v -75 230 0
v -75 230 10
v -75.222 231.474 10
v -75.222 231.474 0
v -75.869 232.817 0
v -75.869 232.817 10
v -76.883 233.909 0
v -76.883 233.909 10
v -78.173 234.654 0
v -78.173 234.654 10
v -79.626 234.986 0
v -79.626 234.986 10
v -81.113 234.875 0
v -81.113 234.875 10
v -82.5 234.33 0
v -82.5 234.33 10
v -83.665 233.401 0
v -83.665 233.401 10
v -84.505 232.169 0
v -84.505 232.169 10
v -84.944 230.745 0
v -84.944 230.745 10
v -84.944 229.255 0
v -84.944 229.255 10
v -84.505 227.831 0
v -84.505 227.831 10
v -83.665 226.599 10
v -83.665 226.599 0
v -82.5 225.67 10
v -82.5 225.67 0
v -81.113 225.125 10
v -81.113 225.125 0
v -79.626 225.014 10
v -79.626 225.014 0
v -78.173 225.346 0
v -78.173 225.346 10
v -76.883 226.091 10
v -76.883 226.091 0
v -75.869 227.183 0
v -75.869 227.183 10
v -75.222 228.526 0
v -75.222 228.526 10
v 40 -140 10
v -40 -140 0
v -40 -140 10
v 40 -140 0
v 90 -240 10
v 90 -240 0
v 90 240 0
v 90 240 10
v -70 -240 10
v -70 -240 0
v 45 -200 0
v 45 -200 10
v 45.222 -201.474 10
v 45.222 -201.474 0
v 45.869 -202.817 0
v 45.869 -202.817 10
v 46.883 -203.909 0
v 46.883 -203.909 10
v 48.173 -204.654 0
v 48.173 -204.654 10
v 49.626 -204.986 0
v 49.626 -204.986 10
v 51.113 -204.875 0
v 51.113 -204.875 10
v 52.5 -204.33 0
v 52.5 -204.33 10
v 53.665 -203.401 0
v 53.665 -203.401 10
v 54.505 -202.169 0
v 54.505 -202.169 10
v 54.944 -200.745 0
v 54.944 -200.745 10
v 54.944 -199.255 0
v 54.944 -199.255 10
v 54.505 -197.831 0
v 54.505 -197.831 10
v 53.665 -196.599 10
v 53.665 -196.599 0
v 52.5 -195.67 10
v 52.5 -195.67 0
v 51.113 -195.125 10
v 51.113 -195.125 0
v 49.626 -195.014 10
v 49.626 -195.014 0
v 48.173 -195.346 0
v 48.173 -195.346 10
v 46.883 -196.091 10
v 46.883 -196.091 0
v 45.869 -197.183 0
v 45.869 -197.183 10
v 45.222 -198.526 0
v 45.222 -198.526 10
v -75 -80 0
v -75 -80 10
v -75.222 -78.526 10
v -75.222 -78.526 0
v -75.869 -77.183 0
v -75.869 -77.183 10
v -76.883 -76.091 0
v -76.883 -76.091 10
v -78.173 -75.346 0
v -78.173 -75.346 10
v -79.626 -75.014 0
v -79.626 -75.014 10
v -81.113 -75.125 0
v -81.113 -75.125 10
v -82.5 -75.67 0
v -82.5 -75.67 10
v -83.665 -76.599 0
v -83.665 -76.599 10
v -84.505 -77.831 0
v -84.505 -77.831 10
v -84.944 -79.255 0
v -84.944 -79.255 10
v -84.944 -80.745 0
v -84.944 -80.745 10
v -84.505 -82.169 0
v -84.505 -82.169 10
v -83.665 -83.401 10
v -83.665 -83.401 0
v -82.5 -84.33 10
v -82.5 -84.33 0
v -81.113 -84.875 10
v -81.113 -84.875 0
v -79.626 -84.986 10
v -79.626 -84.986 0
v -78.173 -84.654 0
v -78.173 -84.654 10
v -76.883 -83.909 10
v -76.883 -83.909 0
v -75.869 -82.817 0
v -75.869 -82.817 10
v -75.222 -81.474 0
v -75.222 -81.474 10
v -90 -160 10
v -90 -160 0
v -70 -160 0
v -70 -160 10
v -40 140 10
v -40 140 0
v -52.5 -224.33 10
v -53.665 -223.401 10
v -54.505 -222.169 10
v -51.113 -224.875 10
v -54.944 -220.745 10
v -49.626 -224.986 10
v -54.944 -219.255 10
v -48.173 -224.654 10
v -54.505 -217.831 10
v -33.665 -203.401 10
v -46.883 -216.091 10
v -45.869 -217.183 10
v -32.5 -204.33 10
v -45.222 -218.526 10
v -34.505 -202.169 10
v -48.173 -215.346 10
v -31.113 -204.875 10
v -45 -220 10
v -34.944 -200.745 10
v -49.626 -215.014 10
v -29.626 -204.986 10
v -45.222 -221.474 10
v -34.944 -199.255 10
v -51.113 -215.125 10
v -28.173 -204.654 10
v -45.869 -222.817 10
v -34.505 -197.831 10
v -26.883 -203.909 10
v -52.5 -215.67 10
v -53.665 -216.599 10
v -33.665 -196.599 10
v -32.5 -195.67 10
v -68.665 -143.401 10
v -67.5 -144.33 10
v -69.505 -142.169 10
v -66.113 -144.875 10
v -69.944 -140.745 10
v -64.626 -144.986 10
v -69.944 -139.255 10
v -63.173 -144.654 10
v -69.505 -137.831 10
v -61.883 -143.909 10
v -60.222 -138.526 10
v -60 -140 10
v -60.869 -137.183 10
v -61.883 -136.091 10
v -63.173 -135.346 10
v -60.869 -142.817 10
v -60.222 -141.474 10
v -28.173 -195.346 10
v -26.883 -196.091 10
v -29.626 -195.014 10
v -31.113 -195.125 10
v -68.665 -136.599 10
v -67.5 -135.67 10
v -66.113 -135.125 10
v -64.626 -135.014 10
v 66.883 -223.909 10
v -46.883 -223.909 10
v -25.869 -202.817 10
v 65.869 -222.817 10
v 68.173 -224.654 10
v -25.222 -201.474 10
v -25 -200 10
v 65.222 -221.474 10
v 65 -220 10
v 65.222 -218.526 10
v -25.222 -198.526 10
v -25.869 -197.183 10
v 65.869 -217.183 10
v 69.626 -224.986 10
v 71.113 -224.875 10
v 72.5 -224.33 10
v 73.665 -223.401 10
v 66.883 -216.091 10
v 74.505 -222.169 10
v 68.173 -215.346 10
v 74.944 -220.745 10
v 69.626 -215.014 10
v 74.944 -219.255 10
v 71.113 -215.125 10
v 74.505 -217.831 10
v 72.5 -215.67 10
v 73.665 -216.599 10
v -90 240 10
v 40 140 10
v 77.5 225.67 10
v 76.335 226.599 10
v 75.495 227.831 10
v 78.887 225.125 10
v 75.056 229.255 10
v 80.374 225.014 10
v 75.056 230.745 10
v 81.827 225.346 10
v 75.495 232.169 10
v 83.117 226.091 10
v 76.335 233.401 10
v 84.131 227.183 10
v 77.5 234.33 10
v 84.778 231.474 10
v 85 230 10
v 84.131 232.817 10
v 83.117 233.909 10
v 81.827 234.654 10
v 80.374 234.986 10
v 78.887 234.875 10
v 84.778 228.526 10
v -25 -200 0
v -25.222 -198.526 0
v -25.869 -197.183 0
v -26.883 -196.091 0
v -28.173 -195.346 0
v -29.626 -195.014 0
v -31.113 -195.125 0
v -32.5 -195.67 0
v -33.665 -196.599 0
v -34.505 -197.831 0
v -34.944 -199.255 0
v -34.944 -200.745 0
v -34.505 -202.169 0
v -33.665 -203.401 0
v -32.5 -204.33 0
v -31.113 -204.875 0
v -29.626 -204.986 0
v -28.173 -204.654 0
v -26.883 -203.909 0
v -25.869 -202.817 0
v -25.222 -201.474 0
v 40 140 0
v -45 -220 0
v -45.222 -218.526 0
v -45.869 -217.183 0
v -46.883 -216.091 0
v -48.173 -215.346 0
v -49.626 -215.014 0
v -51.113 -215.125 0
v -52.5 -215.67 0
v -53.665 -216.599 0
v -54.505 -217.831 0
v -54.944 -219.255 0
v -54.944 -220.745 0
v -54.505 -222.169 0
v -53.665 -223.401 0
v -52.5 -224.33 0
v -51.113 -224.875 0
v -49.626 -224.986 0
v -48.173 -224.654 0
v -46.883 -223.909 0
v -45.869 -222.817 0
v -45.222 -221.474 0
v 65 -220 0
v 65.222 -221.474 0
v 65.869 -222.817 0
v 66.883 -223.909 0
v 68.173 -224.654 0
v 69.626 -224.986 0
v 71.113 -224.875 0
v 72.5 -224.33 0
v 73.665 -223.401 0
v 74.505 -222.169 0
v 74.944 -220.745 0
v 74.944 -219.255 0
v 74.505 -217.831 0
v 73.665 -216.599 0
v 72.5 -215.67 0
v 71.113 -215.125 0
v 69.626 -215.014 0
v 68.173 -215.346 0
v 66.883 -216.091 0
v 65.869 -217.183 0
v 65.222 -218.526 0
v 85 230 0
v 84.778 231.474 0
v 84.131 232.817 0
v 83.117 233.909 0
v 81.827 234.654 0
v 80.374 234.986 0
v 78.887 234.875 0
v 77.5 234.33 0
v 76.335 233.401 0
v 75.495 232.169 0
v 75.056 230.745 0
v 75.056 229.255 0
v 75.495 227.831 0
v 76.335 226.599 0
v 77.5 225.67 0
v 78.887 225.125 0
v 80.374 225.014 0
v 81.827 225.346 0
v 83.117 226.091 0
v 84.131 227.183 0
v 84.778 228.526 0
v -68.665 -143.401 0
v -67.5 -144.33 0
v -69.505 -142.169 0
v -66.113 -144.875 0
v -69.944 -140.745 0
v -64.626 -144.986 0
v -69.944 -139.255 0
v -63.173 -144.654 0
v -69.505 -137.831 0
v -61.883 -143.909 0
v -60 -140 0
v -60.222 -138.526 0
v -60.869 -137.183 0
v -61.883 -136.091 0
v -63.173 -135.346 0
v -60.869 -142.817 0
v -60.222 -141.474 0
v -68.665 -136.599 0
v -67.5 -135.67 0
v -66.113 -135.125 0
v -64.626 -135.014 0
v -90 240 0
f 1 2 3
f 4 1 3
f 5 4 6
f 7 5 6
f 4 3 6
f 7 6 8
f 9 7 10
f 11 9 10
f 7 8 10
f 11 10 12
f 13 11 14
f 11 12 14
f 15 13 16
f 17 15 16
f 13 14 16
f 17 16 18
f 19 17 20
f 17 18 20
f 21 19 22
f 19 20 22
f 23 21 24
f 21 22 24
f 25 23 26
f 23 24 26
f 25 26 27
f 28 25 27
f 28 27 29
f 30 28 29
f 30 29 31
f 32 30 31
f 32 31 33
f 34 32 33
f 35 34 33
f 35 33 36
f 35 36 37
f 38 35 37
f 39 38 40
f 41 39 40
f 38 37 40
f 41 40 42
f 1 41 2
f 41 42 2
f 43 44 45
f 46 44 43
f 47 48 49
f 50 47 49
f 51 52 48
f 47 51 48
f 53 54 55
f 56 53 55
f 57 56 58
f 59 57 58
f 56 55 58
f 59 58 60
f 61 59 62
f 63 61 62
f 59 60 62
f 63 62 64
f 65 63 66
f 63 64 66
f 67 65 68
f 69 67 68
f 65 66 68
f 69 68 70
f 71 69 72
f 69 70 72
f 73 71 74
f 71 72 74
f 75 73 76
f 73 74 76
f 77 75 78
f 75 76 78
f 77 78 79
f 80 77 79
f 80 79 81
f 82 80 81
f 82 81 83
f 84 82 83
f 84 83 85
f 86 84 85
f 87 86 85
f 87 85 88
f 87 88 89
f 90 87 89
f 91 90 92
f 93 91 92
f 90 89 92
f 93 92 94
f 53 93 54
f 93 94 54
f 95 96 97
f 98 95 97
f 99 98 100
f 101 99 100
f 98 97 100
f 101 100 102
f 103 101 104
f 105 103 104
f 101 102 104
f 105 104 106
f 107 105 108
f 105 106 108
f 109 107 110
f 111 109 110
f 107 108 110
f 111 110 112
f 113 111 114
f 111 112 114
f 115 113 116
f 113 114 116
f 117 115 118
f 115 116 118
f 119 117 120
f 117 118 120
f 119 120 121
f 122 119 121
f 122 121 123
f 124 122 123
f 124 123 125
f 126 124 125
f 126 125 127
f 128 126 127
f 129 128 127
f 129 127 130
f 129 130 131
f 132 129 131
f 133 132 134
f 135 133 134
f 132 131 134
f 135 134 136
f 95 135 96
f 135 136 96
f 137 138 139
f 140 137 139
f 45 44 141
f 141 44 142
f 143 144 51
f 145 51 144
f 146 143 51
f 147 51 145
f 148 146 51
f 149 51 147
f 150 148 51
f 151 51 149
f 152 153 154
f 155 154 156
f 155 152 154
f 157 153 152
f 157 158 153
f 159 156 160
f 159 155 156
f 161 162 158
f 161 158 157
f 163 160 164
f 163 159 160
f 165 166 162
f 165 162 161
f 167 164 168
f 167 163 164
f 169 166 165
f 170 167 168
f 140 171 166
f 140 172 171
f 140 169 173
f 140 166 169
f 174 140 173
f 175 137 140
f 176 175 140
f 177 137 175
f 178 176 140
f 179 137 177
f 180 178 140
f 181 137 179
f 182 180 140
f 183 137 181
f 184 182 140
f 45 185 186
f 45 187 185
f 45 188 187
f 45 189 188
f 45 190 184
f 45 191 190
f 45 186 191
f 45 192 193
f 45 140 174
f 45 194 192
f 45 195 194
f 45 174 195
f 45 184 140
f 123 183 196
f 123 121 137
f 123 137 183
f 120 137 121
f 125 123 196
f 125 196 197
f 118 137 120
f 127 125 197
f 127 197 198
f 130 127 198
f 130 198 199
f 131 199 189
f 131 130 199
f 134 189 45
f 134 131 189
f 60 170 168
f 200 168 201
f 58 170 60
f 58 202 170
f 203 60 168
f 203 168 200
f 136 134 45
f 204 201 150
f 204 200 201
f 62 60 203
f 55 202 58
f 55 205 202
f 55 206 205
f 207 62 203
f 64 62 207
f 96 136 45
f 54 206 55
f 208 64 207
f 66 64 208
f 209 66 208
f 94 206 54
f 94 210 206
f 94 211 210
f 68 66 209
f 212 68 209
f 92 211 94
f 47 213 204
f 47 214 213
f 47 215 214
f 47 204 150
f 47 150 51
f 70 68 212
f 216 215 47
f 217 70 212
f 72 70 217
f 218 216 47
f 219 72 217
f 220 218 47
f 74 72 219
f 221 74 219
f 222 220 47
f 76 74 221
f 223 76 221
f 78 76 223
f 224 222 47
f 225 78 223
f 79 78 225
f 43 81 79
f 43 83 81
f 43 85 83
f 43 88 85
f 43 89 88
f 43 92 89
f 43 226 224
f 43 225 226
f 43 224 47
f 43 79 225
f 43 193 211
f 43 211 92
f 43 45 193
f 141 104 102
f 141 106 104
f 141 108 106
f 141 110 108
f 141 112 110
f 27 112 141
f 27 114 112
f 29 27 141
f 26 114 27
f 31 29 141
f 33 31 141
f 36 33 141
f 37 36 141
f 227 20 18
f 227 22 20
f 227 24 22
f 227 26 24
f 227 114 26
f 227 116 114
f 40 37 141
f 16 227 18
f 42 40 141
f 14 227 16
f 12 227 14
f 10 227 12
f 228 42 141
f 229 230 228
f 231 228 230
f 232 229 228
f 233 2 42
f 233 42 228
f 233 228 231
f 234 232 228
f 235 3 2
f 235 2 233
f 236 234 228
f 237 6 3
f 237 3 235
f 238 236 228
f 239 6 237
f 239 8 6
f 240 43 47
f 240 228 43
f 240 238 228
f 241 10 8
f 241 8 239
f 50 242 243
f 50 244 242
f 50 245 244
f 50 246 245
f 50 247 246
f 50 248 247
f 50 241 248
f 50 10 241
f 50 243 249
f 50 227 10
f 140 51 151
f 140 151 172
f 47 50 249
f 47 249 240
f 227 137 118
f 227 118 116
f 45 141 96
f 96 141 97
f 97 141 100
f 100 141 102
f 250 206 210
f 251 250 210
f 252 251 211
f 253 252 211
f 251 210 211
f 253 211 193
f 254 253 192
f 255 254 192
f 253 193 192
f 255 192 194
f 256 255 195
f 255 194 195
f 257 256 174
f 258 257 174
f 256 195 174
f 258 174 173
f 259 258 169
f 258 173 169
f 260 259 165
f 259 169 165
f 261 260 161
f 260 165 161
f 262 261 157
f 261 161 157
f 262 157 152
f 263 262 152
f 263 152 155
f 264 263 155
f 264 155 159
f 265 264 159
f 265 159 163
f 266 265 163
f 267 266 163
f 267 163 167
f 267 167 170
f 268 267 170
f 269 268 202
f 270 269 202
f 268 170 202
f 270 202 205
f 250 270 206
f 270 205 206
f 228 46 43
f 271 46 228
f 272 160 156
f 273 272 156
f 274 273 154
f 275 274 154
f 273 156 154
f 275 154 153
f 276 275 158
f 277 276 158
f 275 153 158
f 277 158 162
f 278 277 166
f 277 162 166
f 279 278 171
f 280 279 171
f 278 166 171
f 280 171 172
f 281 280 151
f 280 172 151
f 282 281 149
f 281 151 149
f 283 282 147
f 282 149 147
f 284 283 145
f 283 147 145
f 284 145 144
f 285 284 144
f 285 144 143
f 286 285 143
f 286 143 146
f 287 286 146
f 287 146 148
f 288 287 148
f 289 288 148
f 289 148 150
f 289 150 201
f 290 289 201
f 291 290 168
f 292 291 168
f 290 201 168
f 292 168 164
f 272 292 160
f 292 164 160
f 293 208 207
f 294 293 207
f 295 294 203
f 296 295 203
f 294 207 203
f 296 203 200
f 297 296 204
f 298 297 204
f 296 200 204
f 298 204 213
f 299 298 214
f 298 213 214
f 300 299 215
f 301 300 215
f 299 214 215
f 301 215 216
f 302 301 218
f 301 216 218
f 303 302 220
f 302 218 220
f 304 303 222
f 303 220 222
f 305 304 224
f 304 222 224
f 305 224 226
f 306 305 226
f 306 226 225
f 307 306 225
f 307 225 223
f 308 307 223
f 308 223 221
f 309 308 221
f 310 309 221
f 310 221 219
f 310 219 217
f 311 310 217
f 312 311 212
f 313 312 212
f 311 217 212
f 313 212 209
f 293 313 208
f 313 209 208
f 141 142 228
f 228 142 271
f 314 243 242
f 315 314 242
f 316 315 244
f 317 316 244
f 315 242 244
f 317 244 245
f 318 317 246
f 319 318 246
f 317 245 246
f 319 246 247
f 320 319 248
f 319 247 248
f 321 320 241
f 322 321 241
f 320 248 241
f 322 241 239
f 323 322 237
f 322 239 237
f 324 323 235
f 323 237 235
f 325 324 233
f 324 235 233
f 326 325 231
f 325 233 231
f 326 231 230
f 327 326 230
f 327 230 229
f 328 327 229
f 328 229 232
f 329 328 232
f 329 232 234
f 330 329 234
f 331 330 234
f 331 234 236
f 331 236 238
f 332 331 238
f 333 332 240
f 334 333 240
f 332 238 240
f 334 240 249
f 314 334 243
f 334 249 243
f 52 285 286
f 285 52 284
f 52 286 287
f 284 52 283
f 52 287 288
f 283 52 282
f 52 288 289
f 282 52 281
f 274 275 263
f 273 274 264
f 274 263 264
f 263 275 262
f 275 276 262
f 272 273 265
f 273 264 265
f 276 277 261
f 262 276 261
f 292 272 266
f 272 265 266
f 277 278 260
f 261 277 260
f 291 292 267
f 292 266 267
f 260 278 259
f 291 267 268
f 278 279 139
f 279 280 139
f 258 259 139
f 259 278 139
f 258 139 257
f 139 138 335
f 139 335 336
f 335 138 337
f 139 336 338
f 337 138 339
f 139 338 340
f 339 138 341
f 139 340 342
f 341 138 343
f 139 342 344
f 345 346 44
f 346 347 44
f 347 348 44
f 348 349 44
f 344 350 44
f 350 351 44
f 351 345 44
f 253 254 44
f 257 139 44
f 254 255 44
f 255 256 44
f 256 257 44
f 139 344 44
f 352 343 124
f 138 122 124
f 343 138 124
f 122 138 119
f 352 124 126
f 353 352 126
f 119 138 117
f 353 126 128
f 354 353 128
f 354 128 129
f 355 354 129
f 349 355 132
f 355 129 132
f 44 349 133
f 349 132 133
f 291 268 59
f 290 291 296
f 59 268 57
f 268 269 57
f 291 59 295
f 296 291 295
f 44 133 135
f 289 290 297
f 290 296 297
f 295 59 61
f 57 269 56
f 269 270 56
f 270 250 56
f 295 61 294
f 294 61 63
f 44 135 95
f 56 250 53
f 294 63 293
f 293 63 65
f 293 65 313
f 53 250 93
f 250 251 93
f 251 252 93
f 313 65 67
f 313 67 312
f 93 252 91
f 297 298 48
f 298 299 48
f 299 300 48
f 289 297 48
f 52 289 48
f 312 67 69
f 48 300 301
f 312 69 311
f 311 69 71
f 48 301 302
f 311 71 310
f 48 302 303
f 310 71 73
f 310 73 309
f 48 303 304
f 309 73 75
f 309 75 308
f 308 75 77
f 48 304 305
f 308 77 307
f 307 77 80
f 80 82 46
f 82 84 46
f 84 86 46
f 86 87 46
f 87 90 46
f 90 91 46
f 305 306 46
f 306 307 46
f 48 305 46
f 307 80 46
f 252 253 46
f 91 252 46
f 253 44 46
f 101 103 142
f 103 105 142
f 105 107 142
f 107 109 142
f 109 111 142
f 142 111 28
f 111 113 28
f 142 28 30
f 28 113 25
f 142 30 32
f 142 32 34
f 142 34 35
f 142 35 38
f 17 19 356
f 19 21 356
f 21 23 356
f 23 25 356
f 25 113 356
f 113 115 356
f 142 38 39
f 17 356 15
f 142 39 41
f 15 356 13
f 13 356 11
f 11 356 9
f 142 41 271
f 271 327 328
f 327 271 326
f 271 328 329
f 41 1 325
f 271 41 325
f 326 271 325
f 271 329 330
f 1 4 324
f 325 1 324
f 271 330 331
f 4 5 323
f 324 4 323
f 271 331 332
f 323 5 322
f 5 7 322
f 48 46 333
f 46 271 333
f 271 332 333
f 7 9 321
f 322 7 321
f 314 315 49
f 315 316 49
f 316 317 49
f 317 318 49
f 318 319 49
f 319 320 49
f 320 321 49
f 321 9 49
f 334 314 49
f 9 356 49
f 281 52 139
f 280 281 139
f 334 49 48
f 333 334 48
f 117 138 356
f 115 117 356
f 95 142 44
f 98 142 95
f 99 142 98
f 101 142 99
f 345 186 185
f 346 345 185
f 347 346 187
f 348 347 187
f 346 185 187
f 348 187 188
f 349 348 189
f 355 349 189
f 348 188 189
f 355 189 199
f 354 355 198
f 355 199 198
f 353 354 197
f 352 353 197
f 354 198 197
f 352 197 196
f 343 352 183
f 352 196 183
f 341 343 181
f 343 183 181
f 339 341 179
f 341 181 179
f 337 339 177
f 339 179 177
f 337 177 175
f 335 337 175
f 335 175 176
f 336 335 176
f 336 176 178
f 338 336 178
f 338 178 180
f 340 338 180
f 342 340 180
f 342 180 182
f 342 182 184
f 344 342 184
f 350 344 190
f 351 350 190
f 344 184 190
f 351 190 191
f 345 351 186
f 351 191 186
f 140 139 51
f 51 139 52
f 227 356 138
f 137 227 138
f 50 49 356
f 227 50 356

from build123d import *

# Parameters (mm, degrees)
SKETCH1_W           = 80
SKETCH1_H           = 280
BOSS_EXTRUDE1_DEPTH = 10
SKETCH6_R           = 5
CUT_EXTRUDE3_DEPTH  = 10


with BuildPart() as part:
    # Sketch1 → Boss-Extrude1 (new body)
    with BuildSketch(Plane.XY):
        Polygon((-90, -160), (-70, -160), (-70, -240), (90, -240), (90, 240), (-90, 240), align=None)
        Rectangle(SKETCH1_W, SKETCH1_H, mode=Mode.SUBTRACT)
    extrude(amount=BOSS_EXTRUDE1_DEPTH)

    # Sketch6 → Cut-Extrude3 (cut)
    with BuildSketch(Plane.XY.offset(10)):
        with Locations((-50, -220)):
            Circle(SKETCH6_R)
        with Locations((-30, -200)):
            Circle(SKETCH6_R)
        with Locations(Location((70, -220, 0), (0, 0, 180))):
            Circle(SKETCH6_R)
        with Locations(Location((50, -200, 0), (0, 0, 180))):
            Circle(SKETCH6_R)
        with Locations((-80, 230)):
            Circle(SKETCH6_R)
        with Locations((80, 230)):
            Circle(SKETCH6_R)
        with Locations((-80, -80)):
            Circle(SKETCH6_R)
        with Locations((-65, -140)):
            Circle(SKETCH6_R)
    extrude(amount=-CUT_EXTRUDE3_DEPTH, mode=Mode.SUBTRACT)


solid = part.part
